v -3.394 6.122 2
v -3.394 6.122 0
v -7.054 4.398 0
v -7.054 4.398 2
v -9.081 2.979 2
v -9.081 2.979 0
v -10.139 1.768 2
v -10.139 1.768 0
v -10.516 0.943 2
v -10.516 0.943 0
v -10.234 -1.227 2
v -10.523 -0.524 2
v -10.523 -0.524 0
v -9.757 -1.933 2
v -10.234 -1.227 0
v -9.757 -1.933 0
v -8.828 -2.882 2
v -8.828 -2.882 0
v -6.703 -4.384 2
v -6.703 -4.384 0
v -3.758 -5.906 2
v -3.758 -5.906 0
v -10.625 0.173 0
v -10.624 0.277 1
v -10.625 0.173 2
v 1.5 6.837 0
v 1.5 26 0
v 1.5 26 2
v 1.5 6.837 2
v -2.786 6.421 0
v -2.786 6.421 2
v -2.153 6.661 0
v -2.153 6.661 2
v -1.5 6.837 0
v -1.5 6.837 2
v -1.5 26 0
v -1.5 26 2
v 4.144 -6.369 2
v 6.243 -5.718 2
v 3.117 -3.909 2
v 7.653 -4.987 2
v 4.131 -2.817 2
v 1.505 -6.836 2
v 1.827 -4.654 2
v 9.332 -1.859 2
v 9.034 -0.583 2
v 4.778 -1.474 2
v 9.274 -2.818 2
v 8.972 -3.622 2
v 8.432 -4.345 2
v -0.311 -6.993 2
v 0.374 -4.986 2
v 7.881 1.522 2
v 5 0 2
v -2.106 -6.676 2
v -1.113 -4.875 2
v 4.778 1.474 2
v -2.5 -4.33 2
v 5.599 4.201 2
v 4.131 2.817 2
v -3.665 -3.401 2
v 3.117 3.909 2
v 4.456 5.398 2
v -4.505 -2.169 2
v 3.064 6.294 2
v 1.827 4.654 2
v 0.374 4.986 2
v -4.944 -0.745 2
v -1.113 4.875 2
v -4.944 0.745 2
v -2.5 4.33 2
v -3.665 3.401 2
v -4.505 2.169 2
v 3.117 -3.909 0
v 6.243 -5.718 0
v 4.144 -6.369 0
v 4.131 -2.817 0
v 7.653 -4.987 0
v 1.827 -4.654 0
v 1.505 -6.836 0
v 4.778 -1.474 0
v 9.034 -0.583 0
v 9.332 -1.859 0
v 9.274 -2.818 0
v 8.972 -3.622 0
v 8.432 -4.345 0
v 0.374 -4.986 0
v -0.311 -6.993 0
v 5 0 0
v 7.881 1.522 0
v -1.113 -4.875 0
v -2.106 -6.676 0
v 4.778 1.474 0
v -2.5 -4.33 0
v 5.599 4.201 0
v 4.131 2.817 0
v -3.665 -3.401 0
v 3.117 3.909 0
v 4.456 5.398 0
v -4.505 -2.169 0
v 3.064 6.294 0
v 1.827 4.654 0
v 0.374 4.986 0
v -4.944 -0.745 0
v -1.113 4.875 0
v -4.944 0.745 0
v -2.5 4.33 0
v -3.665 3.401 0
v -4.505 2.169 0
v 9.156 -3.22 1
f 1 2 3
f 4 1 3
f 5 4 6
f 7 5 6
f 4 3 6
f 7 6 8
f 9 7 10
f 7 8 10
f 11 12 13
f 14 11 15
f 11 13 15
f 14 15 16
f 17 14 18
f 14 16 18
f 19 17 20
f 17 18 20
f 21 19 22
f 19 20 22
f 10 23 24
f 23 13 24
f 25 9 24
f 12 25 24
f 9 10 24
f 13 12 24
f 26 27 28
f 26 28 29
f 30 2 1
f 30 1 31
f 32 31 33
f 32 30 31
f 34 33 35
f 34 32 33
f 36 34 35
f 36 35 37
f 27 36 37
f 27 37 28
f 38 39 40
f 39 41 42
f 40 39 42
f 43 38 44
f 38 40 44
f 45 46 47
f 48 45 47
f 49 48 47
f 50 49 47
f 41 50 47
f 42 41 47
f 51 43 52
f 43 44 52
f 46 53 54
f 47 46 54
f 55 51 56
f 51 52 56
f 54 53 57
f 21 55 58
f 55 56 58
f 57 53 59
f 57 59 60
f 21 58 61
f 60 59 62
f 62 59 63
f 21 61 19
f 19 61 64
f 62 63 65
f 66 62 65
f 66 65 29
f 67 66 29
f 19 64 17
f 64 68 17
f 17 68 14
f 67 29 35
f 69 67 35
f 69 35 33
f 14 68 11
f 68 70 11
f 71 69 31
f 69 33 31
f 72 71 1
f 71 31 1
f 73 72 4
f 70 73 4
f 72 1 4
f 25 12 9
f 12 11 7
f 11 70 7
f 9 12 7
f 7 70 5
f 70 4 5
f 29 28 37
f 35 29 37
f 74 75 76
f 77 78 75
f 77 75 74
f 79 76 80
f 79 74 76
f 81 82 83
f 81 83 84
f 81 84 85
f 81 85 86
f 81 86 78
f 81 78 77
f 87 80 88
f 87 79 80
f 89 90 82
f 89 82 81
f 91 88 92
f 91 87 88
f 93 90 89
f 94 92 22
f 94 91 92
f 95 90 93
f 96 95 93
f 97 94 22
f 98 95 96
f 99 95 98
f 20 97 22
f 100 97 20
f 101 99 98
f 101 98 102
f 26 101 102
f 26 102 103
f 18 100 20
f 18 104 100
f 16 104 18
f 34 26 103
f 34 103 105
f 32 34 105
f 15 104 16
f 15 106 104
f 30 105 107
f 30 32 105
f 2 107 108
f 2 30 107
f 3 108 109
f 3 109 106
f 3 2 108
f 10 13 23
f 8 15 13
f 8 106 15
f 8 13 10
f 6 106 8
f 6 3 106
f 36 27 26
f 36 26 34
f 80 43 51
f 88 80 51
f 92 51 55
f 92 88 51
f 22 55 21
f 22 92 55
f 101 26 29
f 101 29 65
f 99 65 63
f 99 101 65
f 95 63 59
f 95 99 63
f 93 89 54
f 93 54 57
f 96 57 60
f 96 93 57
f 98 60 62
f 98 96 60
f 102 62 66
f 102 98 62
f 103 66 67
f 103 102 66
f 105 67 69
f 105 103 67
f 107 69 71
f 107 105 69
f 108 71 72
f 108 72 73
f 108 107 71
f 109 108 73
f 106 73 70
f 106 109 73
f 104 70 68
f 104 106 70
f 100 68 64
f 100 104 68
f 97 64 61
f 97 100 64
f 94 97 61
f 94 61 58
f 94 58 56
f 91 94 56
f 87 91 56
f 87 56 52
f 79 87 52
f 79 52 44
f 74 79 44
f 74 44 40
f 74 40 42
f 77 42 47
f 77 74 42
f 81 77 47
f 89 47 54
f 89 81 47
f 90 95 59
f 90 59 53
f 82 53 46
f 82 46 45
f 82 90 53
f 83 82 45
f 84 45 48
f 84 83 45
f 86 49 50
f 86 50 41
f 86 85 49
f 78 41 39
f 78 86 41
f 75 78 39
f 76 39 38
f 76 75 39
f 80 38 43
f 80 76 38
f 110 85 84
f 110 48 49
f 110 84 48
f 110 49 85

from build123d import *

# Parameters (mm, degrees)
SKETCH1_R           = 5
BOSS_EXTRUDE1_DEPTH = 2
BOSS_EXTRUDE2_DEPTH = 2


with BuildPart() as part:
    # Sketch1 → Boss-Extrude1 (new body)
    with BuildSketch(Plane.XY):
        with BuildLine():
            Line((-1.5, 6.837397166), (-1.5, 26))
            Line((-1.5, 26), (1.5, 26))
            Line((1.5, 26), (1.5, 6.837397166))
            ThreePointArc((1.5, 6.837397166), (0, -7), (-1.5, 6.837397166))
        make_face()
        Circle(SKETCH1_R, mode=Mode.SUBTRACT)
    extrude(amount=BOSS_EXTRUDE1_DEPTH)

    # Sketch2 → Boss-Extrude2 (add)
    with BuildSketch(Plane(origin=(0, 0, 0), x_dir=(-1, 0, 0), z_dir=(0, 0, -1))):
        with BuildLine():
            add(Edge.make_bspline(
                [(-5.599278763, 4.200961478), (-15.258011941, -5.628125959), (0, -7)],
                knots=[0, 0, 0, 1, 1, 1], degree=2))
            add(Edge.make_bspline(
                [(-5.599278763, 4.200961478), (-7.981604162, -4.535813919), (0, -7)],
                knots=[0, 0, 0, 1, 1, 1], degree=2))
        make_face()
        with BuildLine():
            add(Edge.make_bspline(
                [(3.393610887, 6.122369243), (18.668225354, 0.049737096), (1.677508496, -6.796025695)],
                knots=[0, 0, 0, 1, 1, 1], degree=2))
            add(Edge.make_bspline(
                [(3.393610887, 6.122369243), (10.124192035, -1.414312589), (1.677508496, -6.796025695)],
                knots=[0, 0, 0, 1, 1, 1], degree=2))
        make_face()
    extrude(amount=-BOSS_EXTRUDE2_DEPTH)


solid = part.part
